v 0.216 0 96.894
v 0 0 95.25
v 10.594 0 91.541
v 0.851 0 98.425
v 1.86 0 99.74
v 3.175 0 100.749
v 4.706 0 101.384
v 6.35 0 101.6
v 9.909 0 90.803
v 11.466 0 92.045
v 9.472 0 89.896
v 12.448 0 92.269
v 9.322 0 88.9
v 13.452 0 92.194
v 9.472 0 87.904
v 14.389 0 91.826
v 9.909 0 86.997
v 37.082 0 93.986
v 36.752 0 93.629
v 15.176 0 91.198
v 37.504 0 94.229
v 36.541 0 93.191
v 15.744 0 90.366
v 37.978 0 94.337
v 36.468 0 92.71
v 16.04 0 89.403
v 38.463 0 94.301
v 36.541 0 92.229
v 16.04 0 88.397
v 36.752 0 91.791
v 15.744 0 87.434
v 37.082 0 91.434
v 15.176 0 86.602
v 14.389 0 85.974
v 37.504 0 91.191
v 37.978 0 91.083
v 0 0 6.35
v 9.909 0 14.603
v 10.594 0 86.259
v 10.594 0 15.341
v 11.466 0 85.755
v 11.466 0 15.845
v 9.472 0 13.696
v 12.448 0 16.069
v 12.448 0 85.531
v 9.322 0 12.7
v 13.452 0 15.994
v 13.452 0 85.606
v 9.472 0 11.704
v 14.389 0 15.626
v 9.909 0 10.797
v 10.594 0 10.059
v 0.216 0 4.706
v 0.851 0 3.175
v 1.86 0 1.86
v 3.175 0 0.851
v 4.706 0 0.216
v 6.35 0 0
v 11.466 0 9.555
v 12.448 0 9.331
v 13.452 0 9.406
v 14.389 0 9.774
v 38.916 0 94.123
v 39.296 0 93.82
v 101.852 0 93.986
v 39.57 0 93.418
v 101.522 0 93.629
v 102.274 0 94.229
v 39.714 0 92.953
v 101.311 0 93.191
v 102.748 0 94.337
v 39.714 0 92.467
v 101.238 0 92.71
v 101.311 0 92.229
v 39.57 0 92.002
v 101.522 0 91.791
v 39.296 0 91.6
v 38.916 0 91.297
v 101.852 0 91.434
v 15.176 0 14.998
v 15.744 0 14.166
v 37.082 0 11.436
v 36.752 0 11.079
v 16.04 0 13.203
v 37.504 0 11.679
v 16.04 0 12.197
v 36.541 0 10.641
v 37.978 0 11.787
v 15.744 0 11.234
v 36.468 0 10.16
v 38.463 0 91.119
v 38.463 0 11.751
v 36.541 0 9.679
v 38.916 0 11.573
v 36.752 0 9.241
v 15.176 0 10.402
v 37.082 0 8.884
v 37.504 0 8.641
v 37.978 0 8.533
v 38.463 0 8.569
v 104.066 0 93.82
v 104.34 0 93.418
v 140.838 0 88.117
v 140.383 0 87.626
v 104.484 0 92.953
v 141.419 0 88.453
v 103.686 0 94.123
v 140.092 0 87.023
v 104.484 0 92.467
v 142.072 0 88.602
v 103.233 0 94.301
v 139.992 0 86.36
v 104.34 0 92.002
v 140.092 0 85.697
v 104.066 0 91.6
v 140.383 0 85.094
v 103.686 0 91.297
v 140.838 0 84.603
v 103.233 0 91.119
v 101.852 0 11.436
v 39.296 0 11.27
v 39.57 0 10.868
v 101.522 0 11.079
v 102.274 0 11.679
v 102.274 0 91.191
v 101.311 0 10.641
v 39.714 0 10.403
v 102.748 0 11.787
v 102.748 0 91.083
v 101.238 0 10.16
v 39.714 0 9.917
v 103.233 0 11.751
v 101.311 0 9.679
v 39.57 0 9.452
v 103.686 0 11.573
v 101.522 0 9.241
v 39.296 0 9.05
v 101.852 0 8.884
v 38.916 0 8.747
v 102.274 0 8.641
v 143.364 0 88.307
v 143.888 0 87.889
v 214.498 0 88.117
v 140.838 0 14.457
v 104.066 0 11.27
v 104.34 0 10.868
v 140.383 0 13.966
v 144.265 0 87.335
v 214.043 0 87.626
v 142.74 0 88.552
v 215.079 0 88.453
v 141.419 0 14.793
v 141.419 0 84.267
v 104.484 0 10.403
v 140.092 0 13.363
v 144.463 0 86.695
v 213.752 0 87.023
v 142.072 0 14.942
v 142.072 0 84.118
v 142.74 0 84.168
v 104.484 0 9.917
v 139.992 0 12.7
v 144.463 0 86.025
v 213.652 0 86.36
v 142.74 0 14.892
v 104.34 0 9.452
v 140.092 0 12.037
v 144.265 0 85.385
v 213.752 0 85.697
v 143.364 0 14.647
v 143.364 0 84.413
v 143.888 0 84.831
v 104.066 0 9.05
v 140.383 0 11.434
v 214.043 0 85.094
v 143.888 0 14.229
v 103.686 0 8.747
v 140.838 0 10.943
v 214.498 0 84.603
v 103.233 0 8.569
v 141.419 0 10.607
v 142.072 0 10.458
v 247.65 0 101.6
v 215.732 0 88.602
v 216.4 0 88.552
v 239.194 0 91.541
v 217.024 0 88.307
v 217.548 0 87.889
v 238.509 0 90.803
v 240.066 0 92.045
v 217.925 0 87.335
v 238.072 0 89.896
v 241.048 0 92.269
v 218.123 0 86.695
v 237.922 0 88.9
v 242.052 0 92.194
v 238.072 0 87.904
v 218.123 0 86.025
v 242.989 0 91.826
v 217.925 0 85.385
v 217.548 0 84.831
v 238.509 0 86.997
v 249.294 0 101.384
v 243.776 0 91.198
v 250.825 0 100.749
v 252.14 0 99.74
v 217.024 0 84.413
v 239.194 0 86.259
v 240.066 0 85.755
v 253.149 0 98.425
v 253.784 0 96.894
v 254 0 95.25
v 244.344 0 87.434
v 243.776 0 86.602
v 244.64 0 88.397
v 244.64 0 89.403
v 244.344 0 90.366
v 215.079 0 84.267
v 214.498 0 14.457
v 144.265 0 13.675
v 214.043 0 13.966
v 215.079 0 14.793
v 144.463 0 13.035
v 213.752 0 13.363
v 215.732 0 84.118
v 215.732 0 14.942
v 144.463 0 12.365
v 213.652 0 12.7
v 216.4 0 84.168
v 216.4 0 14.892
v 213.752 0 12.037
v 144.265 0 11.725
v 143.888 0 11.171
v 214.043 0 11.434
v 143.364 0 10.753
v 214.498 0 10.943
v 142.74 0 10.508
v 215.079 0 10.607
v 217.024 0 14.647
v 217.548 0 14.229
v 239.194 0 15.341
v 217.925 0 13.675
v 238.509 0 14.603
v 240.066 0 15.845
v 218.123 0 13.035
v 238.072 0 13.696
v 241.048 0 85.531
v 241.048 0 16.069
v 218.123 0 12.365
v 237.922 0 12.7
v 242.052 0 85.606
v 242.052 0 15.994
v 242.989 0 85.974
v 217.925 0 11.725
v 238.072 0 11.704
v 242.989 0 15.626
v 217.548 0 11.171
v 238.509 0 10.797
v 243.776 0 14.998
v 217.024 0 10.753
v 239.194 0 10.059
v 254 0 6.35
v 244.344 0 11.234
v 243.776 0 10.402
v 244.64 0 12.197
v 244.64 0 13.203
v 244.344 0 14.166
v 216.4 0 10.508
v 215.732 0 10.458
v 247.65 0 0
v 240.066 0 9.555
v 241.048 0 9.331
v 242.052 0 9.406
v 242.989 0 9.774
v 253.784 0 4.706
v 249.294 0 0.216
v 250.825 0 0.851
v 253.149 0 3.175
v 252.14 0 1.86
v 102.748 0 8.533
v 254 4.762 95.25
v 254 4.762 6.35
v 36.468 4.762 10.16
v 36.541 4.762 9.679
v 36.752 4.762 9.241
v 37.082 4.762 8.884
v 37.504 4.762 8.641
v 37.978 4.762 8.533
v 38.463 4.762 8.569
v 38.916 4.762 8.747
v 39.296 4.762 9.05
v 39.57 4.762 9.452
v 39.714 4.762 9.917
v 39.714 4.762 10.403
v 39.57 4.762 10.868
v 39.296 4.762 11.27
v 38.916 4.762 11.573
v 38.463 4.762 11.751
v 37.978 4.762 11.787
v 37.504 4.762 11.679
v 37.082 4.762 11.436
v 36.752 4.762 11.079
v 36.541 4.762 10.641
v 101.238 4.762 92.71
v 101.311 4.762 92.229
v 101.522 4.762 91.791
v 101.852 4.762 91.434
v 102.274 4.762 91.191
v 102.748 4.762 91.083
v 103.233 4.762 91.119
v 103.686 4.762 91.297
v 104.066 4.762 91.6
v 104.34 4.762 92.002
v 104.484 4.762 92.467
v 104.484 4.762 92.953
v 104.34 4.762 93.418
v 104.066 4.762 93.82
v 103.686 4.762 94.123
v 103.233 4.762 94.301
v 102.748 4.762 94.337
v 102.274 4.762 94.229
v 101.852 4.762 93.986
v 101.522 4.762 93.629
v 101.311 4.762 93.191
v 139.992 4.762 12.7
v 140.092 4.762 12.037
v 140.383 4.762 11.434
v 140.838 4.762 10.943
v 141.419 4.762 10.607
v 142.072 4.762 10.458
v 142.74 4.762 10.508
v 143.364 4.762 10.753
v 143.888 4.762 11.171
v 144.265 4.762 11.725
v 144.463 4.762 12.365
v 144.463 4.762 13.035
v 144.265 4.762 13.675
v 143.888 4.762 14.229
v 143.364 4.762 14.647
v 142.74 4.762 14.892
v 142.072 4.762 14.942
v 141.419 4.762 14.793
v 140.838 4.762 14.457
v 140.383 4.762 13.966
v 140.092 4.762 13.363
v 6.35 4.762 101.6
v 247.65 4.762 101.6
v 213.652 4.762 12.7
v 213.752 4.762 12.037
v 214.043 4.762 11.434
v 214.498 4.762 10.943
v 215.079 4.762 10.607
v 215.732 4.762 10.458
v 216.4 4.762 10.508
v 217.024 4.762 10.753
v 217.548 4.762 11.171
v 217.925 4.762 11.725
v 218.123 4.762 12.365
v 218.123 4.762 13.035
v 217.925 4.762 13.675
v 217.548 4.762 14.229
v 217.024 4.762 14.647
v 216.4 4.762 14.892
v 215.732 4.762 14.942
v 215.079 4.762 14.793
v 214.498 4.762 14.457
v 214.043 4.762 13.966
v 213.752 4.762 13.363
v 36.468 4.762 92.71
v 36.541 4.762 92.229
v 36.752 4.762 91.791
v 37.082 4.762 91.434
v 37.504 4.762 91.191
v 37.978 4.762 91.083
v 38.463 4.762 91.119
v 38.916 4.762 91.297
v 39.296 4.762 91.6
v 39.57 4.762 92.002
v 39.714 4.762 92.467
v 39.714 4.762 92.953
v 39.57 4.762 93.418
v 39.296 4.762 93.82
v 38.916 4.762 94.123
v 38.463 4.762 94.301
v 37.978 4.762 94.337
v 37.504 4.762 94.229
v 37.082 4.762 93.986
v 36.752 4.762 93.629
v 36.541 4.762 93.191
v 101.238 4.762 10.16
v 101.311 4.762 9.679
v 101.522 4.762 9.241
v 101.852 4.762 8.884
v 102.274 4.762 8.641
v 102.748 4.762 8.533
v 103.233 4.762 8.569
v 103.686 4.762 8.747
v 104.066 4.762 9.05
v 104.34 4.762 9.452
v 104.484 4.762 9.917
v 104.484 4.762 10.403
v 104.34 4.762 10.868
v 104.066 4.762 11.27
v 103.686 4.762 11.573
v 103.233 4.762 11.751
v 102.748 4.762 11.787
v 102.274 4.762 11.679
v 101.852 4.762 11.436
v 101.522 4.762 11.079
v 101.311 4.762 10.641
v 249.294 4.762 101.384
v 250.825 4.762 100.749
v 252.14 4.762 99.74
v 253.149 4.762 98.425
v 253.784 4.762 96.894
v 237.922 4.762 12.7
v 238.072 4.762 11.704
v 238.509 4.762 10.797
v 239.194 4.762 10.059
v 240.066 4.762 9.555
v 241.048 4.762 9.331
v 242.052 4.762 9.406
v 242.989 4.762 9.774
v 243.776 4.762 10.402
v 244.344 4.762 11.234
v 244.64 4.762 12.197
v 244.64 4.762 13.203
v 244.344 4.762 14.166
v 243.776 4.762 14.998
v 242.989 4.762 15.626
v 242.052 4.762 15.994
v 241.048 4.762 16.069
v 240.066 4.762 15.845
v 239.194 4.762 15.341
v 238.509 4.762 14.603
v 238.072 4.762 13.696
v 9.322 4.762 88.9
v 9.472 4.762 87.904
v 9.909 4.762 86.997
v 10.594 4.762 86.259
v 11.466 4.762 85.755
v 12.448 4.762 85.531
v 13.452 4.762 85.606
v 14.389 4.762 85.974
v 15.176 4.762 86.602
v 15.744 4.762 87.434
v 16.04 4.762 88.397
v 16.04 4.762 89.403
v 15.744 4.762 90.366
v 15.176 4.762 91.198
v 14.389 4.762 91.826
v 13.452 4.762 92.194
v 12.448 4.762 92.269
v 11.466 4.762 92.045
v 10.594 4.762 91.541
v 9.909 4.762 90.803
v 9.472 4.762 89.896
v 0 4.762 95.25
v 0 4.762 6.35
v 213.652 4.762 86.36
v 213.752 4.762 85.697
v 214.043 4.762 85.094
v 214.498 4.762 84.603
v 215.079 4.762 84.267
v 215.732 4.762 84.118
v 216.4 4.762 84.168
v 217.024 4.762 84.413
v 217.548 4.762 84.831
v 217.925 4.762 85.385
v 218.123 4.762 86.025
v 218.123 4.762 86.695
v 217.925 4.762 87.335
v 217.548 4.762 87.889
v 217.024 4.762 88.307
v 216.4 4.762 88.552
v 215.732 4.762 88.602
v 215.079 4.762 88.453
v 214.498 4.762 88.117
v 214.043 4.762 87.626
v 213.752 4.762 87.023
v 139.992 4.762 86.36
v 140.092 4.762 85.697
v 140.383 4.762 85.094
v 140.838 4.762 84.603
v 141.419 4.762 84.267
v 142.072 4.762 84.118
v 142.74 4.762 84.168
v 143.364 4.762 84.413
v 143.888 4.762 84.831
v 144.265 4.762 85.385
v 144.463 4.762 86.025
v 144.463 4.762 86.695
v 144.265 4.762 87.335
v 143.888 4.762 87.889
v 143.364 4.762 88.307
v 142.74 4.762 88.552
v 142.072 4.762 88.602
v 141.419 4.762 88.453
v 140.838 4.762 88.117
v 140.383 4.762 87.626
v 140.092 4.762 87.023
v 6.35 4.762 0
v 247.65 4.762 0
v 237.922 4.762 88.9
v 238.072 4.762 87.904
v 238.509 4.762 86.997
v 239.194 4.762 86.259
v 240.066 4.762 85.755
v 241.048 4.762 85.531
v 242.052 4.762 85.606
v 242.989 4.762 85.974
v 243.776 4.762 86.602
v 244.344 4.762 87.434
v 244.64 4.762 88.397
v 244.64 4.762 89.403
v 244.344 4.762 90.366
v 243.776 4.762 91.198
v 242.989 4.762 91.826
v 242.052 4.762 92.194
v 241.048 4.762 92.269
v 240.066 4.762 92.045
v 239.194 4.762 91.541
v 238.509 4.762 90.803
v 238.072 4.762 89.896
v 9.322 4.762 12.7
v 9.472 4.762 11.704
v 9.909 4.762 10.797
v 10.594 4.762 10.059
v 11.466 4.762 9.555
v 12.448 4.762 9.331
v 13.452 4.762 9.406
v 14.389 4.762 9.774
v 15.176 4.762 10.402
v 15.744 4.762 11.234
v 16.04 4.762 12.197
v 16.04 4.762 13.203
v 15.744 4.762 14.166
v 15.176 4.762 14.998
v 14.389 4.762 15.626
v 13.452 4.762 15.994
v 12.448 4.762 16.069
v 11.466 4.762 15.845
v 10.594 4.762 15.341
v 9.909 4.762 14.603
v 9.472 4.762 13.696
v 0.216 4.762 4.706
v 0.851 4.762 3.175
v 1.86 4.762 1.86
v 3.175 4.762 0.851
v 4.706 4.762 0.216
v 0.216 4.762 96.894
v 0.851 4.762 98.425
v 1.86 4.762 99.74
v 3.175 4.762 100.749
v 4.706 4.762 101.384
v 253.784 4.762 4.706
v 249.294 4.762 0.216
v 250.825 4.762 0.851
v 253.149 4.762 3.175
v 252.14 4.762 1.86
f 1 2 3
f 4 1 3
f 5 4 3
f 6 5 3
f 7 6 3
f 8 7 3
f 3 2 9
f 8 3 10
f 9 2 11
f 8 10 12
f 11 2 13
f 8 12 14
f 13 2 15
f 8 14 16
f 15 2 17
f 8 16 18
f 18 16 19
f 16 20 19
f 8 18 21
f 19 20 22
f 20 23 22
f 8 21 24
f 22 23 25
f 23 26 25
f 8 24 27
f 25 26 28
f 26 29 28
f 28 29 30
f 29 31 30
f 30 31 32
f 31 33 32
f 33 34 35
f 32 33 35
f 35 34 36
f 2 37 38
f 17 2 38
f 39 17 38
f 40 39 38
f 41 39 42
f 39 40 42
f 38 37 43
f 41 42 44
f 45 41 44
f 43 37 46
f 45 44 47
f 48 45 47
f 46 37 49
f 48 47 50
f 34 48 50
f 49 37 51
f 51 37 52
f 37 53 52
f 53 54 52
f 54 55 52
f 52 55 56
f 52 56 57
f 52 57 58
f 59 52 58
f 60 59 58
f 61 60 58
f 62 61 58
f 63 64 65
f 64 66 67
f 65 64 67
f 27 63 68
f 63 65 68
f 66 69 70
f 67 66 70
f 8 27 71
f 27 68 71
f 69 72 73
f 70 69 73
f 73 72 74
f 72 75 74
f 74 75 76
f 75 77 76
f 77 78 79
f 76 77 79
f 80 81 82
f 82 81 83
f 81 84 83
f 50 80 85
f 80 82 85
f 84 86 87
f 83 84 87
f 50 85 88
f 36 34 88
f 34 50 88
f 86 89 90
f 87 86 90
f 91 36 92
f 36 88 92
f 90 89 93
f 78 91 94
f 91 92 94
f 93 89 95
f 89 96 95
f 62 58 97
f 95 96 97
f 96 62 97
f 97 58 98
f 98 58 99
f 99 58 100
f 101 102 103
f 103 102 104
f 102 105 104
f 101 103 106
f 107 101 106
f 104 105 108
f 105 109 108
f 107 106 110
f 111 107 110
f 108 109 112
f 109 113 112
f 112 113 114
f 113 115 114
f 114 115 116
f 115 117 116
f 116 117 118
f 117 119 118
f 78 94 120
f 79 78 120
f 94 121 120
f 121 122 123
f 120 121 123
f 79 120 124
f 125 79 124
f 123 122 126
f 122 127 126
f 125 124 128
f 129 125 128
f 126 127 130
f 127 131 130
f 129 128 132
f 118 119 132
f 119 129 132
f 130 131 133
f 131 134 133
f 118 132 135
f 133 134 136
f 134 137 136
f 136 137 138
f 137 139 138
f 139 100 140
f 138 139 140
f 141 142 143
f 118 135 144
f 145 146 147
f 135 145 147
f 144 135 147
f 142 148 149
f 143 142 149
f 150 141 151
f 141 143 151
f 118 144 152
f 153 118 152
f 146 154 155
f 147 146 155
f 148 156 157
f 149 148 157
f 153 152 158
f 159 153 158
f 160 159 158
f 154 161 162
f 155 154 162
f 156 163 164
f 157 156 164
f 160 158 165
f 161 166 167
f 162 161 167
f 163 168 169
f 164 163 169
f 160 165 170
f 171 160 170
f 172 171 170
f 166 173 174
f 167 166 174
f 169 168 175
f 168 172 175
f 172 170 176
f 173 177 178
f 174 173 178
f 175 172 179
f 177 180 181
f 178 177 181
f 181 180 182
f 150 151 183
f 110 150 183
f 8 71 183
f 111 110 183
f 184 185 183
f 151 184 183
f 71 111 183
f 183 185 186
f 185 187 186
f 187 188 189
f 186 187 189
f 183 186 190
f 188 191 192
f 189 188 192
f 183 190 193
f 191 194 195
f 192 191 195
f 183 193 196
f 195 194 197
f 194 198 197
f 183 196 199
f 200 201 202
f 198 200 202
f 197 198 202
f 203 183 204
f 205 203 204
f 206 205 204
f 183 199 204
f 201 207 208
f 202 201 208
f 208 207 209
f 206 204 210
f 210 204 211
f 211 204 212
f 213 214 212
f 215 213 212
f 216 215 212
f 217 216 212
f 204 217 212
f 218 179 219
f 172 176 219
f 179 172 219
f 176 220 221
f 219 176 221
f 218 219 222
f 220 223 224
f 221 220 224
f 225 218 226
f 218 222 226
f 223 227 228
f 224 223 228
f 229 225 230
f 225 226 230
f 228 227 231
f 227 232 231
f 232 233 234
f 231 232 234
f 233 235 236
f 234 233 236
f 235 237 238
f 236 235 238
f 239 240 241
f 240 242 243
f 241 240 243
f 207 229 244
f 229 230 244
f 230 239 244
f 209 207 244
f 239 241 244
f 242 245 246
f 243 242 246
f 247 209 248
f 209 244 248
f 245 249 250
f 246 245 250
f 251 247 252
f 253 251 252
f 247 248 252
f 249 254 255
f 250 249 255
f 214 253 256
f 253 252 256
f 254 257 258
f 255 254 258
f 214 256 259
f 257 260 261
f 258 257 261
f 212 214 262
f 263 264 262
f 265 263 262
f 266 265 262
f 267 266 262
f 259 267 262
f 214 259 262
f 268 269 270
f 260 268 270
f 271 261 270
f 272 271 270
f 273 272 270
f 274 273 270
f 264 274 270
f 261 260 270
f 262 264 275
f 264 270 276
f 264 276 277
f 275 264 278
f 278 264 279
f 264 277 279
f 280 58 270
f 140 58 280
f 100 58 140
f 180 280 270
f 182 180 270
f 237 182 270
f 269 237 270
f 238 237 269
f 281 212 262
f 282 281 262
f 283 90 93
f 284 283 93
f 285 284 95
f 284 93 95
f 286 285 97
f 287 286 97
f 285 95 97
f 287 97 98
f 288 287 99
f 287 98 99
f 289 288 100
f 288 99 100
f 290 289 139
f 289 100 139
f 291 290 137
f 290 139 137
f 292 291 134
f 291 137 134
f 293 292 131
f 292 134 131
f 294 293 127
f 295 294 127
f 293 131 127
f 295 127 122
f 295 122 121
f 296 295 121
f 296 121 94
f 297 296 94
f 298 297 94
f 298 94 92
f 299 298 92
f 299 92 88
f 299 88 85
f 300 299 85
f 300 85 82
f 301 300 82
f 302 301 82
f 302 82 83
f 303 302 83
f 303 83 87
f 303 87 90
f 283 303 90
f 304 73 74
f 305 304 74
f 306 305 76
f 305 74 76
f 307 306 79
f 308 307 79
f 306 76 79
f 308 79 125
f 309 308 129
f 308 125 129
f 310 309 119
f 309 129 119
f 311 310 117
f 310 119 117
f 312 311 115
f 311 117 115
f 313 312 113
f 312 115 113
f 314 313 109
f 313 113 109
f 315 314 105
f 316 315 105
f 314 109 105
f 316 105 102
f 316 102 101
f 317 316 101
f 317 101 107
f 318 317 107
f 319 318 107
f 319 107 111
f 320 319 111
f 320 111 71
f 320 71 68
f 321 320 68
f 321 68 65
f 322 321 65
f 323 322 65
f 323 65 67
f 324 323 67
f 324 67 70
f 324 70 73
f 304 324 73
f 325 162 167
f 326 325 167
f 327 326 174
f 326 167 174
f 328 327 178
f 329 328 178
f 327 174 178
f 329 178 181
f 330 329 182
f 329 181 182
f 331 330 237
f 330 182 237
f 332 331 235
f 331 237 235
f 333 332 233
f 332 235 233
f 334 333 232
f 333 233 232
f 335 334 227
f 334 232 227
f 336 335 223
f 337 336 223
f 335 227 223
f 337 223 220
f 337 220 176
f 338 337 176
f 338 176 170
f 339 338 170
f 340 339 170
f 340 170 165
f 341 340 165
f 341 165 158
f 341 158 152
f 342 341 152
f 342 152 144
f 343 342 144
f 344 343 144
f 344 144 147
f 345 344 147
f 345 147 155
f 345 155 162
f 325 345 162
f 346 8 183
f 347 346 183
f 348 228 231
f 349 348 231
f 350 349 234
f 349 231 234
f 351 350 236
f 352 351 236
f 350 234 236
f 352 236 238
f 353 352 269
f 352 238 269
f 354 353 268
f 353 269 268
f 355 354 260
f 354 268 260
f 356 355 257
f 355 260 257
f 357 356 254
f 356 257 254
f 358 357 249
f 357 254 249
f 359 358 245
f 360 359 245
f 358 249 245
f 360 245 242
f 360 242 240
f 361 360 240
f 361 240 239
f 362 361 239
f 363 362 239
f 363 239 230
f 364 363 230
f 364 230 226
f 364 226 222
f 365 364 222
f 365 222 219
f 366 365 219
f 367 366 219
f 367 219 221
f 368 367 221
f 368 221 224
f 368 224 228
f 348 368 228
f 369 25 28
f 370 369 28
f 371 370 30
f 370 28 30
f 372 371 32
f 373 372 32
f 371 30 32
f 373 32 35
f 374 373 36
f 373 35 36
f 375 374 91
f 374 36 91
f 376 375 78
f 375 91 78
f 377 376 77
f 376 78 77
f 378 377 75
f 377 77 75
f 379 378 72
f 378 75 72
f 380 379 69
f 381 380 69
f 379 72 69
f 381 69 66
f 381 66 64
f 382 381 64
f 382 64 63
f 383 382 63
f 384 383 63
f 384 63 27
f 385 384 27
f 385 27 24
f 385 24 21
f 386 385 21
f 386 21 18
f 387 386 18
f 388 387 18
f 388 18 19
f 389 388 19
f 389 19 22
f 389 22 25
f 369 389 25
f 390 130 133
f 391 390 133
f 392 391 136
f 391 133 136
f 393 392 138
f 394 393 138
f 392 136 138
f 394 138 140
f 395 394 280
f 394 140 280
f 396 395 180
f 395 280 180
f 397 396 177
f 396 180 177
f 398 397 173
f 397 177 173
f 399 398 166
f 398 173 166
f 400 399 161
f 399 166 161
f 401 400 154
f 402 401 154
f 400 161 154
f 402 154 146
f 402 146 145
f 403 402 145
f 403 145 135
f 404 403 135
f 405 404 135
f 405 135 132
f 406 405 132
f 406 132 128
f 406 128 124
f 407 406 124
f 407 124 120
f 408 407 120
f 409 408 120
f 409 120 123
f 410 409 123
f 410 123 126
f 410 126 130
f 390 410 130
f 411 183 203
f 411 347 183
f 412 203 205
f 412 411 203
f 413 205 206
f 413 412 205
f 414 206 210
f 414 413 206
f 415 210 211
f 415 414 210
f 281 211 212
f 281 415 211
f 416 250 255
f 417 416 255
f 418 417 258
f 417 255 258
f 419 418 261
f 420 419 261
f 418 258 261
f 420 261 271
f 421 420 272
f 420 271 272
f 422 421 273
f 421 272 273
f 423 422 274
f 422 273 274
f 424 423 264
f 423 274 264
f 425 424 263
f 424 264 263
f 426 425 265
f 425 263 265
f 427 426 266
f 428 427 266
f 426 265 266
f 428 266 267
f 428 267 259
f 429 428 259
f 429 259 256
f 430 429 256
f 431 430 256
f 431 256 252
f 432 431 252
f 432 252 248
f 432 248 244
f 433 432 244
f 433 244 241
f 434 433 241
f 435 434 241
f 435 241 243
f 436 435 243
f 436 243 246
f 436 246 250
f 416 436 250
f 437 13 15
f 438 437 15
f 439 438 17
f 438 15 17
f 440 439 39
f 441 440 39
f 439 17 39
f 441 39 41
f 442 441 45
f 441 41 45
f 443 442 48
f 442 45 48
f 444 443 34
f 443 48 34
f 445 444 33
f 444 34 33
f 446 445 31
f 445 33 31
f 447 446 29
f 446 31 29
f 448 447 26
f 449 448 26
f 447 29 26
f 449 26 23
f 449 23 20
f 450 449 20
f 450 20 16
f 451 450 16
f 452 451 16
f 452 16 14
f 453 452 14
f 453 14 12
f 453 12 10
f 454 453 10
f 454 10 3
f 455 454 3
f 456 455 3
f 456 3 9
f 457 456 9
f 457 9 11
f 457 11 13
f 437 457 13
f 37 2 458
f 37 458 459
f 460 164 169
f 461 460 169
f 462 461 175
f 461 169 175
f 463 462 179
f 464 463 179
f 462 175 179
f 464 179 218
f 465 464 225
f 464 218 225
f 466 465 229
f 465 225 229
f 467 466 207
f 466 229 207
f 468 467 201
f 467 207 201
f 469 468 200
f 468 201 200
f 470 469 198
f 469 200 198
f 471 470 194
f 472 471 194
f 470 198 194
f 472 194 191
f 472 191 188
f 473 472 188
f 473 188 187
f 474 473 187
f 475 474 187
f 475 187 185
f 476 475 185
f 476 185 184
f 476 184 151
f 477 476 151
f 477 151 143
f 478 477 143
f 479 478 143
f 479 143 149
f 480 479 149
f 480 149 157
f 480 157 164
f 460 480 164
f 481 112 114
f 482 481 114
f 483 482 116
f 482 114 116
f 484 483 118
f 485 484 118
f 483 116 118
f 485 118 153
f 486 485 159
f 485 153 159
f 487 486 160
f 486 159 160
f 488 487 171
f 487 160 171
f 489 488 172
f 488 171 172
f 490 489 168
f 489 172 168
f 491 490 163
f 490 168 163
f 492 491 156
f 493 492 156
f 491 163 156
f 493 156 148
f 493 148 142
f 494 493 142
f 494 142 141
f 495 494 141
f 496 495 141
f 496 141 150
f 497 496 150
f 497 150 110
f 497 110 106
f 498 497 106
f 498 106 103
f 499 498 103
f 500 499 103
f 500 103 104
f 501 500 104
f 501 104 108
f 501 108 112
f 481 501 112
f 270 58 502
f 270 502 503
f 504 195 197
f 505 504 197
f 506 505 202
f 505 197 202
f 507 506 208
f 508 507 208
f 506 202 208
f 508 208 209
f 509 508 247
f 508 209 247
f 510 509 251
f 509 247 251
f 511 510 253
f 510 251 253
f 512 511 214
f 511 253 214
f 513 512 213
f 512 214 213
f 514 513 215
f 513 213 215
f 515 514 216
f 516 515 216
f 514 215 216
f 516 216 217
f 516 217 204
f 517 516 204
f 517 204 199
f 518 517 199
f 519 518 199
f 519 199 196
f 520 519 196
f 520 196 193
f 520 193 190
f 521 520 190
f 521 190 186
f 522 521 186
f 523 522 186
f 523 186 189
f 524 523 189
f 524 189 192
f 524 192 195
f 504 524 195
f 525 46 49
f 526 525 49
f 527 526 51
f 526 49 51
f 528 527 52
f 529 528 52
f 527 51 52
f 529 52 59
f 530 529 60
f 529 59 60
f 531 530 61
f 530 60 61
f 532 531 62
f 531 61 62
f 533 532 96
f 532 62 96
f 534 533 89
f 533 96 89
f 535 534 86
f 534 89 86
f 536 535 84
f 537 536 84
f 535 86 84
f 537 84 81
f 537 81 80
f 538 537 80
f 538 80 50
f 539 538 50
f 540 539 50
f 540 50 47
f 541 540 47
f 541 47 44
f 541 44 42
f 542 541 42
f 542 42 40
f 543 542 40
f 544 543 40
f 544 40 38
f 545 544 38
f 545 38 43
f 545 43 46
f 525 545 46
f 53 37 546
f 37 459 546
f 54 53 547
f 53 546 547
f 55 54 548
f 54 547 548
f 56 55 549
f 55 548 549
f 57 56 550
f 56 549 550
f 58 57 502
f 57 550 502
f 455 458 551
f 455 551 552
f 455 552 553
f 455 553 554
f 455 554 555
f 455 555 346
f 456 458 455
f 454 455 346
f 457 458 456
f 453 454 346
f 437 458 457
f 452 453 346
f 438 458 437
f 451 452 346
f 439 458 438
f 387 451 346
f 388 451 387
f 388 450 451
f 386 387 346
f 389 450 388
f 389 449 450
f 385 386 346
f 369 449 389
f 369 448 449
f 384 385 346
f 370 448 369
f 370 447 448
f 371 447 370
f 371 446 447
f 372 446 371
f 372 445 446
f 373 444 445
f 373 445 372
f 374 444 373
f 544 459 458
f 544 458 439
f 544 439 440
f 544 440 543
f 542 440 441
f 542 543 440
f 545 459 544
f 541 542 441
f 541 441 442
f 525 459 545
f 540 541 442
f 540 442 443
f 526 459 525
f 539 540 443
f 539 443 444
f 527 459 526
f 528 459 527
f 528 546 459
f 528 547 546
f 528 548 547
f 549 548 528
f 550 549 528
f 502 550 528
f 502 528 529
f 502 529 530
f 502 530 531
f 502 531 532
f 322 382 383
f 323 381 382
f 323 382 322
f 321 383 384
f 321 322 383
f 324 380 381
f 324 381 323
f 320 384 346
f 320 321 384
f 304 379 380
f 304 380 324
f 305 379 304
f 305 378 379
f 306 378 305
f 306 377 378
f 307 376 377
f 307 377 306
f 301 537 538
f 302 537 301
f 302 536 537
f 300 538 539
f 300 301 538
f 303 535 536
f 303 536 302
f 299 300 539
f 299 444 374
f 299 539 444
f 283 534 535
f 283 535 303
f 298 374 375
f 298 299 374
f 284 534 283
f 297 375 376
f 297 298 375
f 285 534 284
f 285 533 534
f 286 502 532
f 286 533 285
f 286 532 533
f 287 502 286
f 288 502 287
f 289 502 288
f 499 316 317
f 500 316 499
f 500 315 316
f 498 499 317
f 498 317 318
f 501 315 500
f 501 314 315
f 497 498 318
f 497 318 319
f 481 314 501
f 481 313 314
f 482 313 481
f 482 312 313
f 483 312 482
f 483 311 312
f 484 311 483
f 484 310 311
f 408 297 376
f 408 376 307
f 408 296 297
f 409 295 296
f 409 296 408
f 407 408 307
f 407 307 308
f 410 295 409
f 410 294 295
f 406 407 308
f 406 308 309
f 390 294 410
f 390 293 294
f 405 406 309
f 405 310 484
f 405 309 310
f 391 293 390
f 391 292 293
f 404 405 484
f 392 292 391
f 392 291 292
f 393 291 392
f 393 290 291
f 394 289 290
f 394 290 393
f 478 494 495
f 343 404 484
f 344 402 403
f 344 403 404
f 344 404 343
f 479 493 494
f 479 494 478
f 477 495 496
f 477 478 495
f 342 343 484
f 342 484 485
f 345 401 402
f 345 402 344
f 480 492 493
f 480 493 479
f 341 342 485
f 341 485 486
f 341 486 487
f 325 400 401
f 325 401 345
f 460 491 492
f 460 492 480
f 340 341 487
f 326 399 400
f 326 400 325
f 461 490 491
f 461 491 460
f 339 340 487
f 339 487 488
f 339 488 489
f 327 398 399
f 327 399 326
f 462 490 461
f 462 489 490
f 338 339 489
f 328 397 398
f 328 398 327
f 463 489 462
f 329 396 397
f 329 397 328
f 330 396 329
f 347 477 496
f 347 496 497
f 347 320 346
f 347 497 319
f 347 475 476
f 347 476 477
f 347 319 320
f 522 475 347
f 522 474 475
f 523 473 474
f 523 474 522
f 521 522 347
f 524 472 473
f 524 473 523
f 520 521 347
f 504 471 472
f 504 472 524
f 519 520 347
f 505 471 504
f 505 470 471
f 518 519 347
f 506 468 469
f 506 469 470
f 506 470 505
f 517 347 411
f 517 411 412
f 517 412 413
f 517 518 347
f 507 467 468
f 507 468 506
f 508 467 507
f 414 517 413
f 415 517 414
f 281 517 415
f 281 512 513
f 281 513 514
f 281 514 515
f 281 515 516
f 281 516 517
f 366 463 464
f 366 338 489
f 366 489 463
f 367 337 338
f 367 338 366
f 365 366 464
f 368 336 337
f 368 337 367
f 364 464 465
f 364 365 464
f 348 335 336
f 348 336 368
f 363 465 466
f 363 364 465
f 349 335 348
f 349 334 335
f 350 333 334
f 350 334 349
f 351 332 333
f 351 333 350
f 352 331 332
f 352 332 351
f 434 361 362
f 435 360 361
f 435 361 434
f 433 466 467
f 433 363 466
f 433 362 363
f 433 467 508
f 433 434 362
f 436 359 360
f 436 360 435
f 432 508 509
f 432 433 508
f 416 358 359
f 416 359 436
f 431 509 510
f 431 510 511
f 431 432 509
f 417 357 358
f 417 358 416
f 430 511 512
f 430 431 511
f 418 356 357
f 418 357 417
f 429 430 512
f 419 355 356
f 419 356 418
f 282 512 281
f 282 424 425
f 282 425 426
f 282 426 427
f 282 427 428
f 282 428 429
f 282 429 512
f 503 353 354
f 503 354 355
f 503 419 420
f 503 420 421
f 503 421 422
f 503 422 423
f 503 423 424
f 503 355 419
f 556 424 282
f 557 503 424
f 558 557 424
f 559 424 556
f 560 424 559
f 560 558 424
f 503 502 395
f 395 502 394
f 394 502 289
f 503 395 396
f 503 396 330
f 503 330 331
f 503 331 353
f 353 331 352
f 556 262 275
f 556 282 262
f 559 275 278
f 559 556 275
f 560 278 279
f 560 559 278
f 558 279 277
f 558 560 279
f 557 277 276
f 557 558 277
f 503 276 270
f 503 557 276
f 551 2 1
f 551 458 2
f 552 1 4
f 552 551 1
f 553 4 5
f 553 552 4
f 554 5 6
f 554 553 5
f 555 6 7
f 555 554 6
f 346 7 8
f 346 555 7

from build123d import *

# Parameters (mm, degrees)
SKETCH2_W               = 254
SKETCH2_H               = 101.6
BOSS_EXTRUDE1_DEPTH     = 4.7625
FILLET1_R               = 6.35
F_1_4_CLEARANCE_HOLE1_D = 6.7564
F_8_CLEARANCE_HOLE1_D   = 4.4958
F_4_CLEARANCE_HOLE1_D   = 3.2639


with BuildPart() as part:
    # Sketch2 → Boss-Extrude1 (new body)
    with BuildSketch(Plane(origin=(0, 0, 0), x_dir=(1, 0, 0), z_dir=(0, 1, 0))):
        with Locations((127, -50.8)):
            Rectangle(SKETCH2_W, SKETCH2_H)
    extrude(amount=BOSS_EXTRUDE1_DEPTH)

    # Fillet1
    fillet1_edges = [part.edges().sort_by_distance(p)[0] for p in [
        (0, 2.38125, 0),
        (254, 2.38125, 0),
        (254, 2.38125, 101.6),
        (0, 2.38125, 101.6),
    ]]
    fillet(fillet1_edges, radius=FILLET1_R)

    # 1/4 Clearance Hole1 (through all)
    with Locations(Plane(origin=(0, 4.7625, 0), x_dir=(1, 0, 0), z_dir=(0, 1, 0))):
        with Locations((12.7, -12.7), (12.7, -88.9), (241.3, -88.9), (241.3, -12.7)):
            Hole(F_1_4_CLEARANCE_HOLE1_D / 2)

    # #8 Clearance Hole1 (through all)
    with Locations(Plane(origin=(0, 4.7625, 0), x_dir=(1, 0, 0), z_dir=(0, 1, 0))):
        with Locations((142.24, -12.7), (215.9, -12.7), (215.9, -86.36), (142.24, -86.36)):
            Hole(F_8_CLEARANCE_HOLE1_D / 2)

    # #4 Clearance Hole1 (through all)
    with Locations(Plane(origin=(0, 4.7625, 0), x_dir=(1, 0, 0), z_dir=(0, 1, 0))):
        with Locations((38.1, -10.16), (102.87, -10.16), (102.87, -92.71), (38.1, -92.71)):
            Hole(F_4_CLEARANCE_HOLE1_D / 2)


solid = part.part
